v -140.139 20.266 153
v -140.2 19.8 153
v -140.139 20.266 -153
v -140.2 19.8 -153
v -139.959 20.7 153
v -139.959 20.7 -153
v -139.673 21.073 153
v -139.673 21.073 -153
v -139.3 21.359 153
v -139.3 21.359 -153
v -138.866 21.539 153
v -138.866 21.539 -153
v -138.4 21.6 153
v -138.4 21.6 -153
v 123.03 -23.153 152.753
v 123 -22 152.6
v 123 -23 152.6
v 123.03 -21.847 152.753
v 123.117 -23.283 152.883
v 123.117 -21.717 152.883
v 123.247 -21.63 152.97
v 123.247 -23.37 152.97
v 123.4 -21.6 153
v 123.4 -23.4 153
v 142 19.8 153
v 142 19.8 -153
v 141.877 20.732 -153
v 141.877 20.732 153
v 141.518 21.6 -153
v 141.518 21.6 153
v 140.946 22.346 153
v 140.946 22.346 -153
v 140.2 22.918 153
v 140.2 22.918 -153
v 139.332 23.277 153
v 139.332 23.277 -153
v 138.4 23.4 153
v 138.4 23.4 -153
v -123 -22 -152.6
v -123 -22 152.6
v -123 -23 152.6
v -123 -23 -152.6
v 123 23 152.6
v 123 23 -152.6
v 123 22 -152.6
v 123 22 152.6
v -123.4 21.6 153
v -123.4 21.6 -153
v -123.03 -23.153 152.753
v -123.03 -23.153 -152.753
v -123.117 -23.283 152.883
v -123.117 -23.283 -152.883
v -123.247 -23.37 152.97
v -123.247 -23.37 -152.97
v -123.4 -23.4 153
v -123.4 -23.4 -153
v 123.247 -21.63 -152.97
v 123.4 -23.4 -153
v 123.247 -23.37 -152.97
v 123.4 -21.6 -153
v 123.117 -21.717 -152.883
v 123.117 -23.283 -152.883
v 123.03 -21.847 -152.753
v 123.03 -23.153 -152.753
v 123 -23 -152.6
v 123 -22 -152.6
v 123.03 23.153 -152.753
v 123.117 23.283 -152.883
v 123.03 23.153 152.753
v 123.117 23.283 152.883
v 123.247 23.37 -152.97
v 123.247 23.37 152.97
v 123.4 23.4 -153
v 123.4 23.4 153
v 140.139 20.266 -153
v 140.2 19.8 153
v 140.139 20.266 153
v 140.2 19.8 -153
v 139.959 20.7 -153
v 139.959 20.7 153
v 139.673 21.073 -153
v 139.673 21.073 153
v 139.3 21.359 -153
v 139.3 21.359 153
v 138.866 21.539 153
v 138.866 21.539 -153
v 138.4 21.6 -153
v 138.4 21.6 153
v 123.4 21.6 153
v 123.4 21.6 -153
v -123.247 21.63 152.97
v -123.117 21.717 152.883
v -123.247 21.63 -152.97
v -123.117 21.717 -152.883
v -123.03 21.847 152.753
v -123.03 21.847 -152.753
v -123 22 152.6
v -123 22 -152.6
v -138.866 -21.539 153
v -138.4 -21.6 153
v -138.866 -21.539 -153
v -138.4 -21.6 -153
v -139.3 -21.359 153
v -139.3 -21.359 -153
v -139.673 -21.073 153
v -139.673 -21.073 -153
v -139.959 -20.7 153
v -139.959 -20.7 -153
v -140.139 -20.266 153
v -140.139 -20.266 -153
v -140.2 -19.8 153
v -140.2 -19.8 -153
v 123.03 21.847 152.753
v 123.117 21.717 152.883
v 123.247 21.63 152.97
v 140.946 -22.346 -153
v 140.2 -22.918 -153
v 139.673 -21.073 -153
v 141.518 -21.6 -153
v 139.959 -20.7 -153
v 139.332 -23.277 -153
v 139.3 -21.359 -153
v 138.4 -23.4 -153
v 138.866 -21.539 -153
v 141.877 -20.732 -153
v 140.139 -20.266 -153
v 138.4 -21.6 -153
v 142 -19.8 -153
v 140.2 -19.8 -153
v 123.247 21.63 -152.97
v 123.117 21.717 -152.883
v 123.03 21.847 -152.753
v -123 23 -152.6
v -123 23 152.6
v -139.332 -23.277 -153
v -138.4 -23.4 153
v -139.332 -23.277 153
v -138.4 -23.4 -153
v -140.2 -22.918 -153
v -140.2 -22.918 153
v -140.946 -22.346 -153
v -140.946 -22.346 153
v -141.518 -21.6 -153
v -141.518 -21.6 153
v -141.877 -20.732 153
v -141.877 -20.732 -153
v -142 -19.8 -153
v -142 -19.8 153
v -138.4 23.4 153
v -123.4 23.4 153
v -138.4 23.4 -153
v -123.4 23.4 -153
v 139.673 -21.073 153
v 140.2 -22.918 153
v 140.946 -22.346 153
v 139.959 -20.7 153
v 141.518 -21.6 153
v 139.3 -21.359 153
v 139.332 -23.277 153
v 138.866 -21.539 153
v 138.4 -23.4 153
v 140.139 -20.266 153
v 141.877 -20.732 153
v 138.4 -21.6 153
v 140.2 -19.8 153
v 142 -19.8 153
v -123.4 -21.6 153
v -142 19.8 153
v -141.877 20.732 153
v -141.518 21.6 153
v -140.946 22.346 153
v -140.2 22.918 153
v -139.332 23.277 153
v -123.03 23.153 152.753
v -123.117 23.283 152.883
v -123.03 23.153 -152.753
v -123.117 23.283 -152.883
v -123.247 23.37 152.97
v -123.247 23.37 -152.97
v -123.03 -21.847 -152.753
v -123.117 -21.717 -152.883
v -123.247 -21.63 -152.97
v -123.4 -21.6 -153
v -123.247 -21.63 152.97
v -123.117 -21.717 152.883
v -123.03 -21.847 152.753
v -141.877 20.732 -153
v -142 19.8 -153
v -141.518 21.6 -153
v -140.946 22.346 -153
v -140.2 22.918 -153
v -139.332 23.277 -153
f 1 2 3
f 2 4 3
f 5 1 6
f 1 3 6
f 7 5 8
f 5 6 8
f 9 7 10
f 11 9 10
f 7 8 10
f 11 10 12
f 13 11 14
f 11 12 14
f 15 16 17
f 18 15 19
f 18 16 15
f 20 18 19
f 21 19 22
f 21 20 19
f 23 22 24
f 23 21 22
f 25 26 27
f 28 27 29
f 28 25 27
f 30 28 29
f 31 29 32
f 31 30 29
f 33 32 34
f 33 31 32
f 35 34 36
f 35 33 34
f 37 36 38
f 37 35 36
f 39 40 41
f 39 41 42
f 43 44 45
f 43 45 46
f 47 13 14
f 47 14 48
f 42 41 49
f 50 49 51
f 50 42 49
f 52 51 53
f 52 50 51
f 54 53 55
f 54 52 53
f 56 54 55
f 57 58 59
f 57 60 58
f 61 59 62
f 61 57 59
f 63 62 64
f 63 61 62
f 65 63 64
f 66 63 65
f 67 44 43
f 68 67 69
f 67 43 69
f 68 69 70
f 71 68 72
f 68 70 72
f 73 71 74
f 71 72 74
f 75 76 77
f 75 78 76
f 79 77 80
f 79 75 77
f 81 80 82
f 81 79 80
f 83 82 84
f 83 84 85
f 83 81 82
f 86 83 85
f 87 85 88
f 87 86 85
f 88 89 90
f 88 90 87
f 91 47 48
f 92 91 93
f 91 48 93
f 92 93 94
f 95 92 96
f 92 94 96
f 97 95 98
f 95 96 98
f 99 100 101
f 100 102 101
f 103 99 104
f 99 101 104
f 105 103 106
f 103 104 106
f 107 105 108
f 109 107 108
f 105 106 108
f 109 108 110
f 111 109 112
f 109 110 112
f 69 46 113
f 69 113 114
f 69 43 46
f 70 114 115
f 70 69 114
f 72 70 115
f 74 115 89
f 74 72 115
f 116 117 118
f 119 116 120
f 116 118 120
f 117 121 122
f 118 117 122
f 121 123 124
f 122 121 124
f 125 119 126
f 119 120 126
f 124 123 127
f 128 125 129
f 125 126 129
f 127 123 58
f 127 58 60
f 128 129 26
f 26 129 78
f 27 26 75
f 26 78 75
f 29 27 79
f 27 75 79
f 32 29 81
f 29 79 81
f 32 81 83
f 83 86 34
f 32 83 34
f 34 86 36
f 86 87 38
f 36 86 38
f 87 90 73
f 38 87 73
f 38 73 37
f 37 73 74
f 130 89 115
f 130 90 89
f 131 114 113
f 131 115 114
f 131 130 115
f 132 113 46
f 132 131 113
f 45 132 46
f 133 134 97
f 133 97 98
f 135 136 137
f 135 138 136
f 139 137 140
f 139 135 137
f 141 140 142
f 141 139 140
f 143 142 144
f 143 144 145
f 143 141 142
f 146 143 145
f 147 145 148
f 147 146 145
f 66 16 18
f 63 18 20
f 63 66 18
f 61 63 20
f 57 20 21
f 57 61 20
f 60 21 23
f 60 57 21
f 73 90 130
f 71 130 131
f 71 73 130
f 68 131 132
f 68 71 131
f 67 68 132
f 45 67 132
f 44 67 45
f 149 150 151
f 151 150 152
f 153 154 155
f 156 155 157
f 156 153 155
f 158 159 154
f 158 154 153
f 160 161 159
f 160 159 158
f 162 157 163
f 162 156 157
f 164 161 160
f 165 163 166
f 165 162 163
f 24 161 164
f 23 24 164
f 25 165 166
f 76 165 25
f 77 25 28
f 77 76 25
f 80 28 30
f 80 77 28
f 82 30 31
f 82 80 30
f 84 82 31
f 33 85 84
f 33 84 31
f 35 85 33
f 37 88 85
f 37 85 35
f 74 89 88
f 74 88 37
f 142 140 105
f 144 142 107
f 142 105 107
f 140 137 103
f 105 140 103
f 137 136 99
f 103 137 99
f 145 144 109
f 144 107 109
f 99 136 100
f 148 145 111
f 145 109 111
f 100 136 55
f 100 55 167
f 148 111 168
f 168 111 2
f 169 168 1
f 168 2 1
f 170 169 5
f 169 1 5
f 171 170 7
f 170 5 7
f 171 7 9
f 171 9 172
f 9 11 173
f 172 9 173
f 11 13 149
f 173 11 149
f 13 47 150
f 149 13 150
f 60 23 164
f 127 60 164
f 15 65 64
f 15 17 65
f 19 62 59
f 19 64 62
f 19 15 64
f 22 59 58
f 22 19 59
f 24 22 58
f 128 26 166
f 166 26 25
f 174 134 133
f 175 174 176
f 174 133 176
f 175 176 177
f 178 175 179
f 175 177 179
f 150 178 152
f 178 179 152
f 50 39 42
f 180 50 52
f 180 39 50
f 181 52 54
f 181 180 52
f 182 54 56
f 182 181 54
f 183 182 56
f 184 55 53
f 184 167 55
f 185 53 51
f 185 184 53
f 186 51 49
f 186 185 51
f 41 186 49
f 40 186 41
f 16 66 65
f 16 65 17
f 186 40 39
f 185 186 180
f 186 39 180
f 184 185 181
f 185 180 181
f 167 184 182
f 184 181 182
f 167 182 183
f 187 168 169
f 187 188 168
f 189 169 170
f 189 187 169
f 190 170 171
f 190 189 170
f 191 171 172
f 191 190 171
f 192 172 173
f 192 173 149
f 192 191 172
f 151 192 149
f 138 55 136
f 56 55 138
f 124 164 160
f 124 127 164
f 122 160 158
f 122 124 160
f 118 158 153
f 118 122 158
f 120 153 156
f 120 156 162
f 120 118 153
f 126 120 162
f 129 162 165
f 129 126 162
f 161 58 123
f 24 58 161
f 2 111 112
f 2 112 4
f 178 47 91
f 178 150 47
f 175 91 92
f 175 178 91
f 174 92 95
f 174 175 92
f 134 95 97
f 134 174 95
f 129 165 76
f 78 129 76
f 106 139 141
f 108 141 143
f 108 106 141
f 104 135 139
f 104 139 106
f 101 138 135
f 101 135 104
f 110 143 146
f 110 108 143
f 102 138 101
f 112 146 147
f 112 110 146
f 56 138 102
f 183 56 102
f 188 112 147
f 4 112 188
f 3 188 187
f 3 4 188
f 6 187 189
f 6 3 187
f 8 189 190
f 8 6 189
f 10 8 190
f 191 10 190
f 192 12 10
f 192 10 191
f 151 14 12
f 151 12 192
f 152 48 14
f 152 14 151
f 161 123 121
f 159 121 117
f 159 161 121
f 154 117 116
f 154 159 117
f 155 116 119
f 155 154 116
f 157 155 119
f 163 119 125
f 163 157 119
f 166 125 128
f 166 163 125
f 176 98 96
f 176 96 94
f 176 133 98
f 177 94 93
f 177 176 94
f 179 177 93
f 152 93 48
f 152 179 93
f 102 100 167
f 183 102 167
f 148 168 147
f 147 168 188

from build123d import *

# Parameters (mm, degrees)
SKETCH6_W           = 306
SKETCH6_H           = 46.8
BOSS_EXTRUDE2_DEPTH = 19
SKETCH7_W           = 17.2
SKETCH7_H           = 43.2
CUT_EXTRUDE2_DEPTH  = 307
FILLET4_R           = 0.4
FILLET5_R           = 1.8
FILLET6_R           = 3.6
SKETCH12_W          = 306
SKETCH12_H          = 46.8
BOSS_EXTRUDE3_DEPTH = 19
SKETCH13_W          = 17.2
SKETCH13_H          = 43.2
CUT_EXTRUDE3_DEPTH  = 307
FILLET7_R           = 0.4
FILLET8_R           = 1.8
FILLET9_R           = 3.6


with BuildPart() as part:
    # Sketch6 → Boss-Extrude2 (new body)
    with BuildSketch(Plane.ZY.offset(-123)):
        Rectangle(SKETCH6_W, SKETCH6_H)
    extrude(amount=-BOSS_EXTRUDE2_DEPTH)

    # Sketch7 → Cut-Extrude2 (cut, through all)
    with BuildSketch(Plane.XY.offset(153)):
        with Locations((131.6, 0)):
            Rectangle(SKETCH7_W, SKETCH7_H)
    extrude(amount=-CUT_EXTRUDE2_DEPTH, mode=Mode.SUBTRACT)

    # Fillet4
    fillet4_edges = [part.edges().sort_by_distance(p)[0] for p in [
        (123, 22.5, 153),
        (123, -22.5, -153),
        (123, -21.6, 0),
        (123, 21.6, 0),
        (123, -23.4, 0),
        (123, 22.5, -153),
        (123, 23.4, 0),
        (123, -22.5, 153),
    ]]
    fillet(fillet4_edges, radius=FILLET4_R)

    # Fillet5
    fillet5_edges = [part.edges().sort_by_distance(p)[0] for p in [
        (140.2, 21.6, 0),
        (140.2, -21.6, 0),
    ]]
    fillet(fillet5_edges, radius=FILLET5_R)

    # Fillet6
    fillet6_edges = [part.edges().sort_by_distance(p)[0] for p in [
        (142, -23.4, 0),
        (142, 23.4, 0),
    ]]
    fillet(fillet6_edges, radius=FILLET6_R)


with BuildPart() as body_2:
    # Sketch12 → Boss-Extrude3 (new body)
    with BuildSketch(Plane(origin=(-123, 0, 0), x_dir=(0, 0, -1), z_dir=(1, 0, 0))):
        Rectangle(SKETCH12_W, SKETCH12_H)
    extrude(amount=-BOSS_EXTRUDE3_DEPTH)

    # Sketch13 → Cut-Extrude3 (cut, through all)
    with BuildSketch(Plane.XY.offset(153)):
        with Locations((-131.6, 0)):
            Rectangle(SKETCH13_W, SKETCH13_H)
    extrude(amount=-CUT_EXTRUDE3_DEPTH, mode=Mode.SUBTRACT)

    # Fillet7
    fillet7_edges = [body_2.edges().sort_by_distance(p)[0] for p in [
        (-123, -22.5, 153),
        (-123, 22.5, -153),
        (-123, -21.6, 0),
        (-123, 21.6, 0),
        (-123, -22.5, -153),
        (-123, -23.4, 0),
        (-123, 22.5, 153),
        (-123, 23.4, 0),
    ]]
    fillet(fillet7_edges, radius=FILLET7_R)

    # Fillet8
    fillet8_edges = [body_2.edges().sort_by_distance(p)[0] for p in [
        (-140.2, -21.6, 0),
        (-140.2, 21.6, 0),
    ]]
    fillet(fillet8_edges, radius=FILLET8_R)

    # Fillet9
    fillet9_edges = [body_2.edges().sort_by_distance(p)[0] for p in [
        (-142, -23.4, 0),
        (-142, 23.4, 0),
    ]]
    fillet(fillet9_edges, radius=FILLET9_R)


solid = Compound([part.part, body_2.part])
